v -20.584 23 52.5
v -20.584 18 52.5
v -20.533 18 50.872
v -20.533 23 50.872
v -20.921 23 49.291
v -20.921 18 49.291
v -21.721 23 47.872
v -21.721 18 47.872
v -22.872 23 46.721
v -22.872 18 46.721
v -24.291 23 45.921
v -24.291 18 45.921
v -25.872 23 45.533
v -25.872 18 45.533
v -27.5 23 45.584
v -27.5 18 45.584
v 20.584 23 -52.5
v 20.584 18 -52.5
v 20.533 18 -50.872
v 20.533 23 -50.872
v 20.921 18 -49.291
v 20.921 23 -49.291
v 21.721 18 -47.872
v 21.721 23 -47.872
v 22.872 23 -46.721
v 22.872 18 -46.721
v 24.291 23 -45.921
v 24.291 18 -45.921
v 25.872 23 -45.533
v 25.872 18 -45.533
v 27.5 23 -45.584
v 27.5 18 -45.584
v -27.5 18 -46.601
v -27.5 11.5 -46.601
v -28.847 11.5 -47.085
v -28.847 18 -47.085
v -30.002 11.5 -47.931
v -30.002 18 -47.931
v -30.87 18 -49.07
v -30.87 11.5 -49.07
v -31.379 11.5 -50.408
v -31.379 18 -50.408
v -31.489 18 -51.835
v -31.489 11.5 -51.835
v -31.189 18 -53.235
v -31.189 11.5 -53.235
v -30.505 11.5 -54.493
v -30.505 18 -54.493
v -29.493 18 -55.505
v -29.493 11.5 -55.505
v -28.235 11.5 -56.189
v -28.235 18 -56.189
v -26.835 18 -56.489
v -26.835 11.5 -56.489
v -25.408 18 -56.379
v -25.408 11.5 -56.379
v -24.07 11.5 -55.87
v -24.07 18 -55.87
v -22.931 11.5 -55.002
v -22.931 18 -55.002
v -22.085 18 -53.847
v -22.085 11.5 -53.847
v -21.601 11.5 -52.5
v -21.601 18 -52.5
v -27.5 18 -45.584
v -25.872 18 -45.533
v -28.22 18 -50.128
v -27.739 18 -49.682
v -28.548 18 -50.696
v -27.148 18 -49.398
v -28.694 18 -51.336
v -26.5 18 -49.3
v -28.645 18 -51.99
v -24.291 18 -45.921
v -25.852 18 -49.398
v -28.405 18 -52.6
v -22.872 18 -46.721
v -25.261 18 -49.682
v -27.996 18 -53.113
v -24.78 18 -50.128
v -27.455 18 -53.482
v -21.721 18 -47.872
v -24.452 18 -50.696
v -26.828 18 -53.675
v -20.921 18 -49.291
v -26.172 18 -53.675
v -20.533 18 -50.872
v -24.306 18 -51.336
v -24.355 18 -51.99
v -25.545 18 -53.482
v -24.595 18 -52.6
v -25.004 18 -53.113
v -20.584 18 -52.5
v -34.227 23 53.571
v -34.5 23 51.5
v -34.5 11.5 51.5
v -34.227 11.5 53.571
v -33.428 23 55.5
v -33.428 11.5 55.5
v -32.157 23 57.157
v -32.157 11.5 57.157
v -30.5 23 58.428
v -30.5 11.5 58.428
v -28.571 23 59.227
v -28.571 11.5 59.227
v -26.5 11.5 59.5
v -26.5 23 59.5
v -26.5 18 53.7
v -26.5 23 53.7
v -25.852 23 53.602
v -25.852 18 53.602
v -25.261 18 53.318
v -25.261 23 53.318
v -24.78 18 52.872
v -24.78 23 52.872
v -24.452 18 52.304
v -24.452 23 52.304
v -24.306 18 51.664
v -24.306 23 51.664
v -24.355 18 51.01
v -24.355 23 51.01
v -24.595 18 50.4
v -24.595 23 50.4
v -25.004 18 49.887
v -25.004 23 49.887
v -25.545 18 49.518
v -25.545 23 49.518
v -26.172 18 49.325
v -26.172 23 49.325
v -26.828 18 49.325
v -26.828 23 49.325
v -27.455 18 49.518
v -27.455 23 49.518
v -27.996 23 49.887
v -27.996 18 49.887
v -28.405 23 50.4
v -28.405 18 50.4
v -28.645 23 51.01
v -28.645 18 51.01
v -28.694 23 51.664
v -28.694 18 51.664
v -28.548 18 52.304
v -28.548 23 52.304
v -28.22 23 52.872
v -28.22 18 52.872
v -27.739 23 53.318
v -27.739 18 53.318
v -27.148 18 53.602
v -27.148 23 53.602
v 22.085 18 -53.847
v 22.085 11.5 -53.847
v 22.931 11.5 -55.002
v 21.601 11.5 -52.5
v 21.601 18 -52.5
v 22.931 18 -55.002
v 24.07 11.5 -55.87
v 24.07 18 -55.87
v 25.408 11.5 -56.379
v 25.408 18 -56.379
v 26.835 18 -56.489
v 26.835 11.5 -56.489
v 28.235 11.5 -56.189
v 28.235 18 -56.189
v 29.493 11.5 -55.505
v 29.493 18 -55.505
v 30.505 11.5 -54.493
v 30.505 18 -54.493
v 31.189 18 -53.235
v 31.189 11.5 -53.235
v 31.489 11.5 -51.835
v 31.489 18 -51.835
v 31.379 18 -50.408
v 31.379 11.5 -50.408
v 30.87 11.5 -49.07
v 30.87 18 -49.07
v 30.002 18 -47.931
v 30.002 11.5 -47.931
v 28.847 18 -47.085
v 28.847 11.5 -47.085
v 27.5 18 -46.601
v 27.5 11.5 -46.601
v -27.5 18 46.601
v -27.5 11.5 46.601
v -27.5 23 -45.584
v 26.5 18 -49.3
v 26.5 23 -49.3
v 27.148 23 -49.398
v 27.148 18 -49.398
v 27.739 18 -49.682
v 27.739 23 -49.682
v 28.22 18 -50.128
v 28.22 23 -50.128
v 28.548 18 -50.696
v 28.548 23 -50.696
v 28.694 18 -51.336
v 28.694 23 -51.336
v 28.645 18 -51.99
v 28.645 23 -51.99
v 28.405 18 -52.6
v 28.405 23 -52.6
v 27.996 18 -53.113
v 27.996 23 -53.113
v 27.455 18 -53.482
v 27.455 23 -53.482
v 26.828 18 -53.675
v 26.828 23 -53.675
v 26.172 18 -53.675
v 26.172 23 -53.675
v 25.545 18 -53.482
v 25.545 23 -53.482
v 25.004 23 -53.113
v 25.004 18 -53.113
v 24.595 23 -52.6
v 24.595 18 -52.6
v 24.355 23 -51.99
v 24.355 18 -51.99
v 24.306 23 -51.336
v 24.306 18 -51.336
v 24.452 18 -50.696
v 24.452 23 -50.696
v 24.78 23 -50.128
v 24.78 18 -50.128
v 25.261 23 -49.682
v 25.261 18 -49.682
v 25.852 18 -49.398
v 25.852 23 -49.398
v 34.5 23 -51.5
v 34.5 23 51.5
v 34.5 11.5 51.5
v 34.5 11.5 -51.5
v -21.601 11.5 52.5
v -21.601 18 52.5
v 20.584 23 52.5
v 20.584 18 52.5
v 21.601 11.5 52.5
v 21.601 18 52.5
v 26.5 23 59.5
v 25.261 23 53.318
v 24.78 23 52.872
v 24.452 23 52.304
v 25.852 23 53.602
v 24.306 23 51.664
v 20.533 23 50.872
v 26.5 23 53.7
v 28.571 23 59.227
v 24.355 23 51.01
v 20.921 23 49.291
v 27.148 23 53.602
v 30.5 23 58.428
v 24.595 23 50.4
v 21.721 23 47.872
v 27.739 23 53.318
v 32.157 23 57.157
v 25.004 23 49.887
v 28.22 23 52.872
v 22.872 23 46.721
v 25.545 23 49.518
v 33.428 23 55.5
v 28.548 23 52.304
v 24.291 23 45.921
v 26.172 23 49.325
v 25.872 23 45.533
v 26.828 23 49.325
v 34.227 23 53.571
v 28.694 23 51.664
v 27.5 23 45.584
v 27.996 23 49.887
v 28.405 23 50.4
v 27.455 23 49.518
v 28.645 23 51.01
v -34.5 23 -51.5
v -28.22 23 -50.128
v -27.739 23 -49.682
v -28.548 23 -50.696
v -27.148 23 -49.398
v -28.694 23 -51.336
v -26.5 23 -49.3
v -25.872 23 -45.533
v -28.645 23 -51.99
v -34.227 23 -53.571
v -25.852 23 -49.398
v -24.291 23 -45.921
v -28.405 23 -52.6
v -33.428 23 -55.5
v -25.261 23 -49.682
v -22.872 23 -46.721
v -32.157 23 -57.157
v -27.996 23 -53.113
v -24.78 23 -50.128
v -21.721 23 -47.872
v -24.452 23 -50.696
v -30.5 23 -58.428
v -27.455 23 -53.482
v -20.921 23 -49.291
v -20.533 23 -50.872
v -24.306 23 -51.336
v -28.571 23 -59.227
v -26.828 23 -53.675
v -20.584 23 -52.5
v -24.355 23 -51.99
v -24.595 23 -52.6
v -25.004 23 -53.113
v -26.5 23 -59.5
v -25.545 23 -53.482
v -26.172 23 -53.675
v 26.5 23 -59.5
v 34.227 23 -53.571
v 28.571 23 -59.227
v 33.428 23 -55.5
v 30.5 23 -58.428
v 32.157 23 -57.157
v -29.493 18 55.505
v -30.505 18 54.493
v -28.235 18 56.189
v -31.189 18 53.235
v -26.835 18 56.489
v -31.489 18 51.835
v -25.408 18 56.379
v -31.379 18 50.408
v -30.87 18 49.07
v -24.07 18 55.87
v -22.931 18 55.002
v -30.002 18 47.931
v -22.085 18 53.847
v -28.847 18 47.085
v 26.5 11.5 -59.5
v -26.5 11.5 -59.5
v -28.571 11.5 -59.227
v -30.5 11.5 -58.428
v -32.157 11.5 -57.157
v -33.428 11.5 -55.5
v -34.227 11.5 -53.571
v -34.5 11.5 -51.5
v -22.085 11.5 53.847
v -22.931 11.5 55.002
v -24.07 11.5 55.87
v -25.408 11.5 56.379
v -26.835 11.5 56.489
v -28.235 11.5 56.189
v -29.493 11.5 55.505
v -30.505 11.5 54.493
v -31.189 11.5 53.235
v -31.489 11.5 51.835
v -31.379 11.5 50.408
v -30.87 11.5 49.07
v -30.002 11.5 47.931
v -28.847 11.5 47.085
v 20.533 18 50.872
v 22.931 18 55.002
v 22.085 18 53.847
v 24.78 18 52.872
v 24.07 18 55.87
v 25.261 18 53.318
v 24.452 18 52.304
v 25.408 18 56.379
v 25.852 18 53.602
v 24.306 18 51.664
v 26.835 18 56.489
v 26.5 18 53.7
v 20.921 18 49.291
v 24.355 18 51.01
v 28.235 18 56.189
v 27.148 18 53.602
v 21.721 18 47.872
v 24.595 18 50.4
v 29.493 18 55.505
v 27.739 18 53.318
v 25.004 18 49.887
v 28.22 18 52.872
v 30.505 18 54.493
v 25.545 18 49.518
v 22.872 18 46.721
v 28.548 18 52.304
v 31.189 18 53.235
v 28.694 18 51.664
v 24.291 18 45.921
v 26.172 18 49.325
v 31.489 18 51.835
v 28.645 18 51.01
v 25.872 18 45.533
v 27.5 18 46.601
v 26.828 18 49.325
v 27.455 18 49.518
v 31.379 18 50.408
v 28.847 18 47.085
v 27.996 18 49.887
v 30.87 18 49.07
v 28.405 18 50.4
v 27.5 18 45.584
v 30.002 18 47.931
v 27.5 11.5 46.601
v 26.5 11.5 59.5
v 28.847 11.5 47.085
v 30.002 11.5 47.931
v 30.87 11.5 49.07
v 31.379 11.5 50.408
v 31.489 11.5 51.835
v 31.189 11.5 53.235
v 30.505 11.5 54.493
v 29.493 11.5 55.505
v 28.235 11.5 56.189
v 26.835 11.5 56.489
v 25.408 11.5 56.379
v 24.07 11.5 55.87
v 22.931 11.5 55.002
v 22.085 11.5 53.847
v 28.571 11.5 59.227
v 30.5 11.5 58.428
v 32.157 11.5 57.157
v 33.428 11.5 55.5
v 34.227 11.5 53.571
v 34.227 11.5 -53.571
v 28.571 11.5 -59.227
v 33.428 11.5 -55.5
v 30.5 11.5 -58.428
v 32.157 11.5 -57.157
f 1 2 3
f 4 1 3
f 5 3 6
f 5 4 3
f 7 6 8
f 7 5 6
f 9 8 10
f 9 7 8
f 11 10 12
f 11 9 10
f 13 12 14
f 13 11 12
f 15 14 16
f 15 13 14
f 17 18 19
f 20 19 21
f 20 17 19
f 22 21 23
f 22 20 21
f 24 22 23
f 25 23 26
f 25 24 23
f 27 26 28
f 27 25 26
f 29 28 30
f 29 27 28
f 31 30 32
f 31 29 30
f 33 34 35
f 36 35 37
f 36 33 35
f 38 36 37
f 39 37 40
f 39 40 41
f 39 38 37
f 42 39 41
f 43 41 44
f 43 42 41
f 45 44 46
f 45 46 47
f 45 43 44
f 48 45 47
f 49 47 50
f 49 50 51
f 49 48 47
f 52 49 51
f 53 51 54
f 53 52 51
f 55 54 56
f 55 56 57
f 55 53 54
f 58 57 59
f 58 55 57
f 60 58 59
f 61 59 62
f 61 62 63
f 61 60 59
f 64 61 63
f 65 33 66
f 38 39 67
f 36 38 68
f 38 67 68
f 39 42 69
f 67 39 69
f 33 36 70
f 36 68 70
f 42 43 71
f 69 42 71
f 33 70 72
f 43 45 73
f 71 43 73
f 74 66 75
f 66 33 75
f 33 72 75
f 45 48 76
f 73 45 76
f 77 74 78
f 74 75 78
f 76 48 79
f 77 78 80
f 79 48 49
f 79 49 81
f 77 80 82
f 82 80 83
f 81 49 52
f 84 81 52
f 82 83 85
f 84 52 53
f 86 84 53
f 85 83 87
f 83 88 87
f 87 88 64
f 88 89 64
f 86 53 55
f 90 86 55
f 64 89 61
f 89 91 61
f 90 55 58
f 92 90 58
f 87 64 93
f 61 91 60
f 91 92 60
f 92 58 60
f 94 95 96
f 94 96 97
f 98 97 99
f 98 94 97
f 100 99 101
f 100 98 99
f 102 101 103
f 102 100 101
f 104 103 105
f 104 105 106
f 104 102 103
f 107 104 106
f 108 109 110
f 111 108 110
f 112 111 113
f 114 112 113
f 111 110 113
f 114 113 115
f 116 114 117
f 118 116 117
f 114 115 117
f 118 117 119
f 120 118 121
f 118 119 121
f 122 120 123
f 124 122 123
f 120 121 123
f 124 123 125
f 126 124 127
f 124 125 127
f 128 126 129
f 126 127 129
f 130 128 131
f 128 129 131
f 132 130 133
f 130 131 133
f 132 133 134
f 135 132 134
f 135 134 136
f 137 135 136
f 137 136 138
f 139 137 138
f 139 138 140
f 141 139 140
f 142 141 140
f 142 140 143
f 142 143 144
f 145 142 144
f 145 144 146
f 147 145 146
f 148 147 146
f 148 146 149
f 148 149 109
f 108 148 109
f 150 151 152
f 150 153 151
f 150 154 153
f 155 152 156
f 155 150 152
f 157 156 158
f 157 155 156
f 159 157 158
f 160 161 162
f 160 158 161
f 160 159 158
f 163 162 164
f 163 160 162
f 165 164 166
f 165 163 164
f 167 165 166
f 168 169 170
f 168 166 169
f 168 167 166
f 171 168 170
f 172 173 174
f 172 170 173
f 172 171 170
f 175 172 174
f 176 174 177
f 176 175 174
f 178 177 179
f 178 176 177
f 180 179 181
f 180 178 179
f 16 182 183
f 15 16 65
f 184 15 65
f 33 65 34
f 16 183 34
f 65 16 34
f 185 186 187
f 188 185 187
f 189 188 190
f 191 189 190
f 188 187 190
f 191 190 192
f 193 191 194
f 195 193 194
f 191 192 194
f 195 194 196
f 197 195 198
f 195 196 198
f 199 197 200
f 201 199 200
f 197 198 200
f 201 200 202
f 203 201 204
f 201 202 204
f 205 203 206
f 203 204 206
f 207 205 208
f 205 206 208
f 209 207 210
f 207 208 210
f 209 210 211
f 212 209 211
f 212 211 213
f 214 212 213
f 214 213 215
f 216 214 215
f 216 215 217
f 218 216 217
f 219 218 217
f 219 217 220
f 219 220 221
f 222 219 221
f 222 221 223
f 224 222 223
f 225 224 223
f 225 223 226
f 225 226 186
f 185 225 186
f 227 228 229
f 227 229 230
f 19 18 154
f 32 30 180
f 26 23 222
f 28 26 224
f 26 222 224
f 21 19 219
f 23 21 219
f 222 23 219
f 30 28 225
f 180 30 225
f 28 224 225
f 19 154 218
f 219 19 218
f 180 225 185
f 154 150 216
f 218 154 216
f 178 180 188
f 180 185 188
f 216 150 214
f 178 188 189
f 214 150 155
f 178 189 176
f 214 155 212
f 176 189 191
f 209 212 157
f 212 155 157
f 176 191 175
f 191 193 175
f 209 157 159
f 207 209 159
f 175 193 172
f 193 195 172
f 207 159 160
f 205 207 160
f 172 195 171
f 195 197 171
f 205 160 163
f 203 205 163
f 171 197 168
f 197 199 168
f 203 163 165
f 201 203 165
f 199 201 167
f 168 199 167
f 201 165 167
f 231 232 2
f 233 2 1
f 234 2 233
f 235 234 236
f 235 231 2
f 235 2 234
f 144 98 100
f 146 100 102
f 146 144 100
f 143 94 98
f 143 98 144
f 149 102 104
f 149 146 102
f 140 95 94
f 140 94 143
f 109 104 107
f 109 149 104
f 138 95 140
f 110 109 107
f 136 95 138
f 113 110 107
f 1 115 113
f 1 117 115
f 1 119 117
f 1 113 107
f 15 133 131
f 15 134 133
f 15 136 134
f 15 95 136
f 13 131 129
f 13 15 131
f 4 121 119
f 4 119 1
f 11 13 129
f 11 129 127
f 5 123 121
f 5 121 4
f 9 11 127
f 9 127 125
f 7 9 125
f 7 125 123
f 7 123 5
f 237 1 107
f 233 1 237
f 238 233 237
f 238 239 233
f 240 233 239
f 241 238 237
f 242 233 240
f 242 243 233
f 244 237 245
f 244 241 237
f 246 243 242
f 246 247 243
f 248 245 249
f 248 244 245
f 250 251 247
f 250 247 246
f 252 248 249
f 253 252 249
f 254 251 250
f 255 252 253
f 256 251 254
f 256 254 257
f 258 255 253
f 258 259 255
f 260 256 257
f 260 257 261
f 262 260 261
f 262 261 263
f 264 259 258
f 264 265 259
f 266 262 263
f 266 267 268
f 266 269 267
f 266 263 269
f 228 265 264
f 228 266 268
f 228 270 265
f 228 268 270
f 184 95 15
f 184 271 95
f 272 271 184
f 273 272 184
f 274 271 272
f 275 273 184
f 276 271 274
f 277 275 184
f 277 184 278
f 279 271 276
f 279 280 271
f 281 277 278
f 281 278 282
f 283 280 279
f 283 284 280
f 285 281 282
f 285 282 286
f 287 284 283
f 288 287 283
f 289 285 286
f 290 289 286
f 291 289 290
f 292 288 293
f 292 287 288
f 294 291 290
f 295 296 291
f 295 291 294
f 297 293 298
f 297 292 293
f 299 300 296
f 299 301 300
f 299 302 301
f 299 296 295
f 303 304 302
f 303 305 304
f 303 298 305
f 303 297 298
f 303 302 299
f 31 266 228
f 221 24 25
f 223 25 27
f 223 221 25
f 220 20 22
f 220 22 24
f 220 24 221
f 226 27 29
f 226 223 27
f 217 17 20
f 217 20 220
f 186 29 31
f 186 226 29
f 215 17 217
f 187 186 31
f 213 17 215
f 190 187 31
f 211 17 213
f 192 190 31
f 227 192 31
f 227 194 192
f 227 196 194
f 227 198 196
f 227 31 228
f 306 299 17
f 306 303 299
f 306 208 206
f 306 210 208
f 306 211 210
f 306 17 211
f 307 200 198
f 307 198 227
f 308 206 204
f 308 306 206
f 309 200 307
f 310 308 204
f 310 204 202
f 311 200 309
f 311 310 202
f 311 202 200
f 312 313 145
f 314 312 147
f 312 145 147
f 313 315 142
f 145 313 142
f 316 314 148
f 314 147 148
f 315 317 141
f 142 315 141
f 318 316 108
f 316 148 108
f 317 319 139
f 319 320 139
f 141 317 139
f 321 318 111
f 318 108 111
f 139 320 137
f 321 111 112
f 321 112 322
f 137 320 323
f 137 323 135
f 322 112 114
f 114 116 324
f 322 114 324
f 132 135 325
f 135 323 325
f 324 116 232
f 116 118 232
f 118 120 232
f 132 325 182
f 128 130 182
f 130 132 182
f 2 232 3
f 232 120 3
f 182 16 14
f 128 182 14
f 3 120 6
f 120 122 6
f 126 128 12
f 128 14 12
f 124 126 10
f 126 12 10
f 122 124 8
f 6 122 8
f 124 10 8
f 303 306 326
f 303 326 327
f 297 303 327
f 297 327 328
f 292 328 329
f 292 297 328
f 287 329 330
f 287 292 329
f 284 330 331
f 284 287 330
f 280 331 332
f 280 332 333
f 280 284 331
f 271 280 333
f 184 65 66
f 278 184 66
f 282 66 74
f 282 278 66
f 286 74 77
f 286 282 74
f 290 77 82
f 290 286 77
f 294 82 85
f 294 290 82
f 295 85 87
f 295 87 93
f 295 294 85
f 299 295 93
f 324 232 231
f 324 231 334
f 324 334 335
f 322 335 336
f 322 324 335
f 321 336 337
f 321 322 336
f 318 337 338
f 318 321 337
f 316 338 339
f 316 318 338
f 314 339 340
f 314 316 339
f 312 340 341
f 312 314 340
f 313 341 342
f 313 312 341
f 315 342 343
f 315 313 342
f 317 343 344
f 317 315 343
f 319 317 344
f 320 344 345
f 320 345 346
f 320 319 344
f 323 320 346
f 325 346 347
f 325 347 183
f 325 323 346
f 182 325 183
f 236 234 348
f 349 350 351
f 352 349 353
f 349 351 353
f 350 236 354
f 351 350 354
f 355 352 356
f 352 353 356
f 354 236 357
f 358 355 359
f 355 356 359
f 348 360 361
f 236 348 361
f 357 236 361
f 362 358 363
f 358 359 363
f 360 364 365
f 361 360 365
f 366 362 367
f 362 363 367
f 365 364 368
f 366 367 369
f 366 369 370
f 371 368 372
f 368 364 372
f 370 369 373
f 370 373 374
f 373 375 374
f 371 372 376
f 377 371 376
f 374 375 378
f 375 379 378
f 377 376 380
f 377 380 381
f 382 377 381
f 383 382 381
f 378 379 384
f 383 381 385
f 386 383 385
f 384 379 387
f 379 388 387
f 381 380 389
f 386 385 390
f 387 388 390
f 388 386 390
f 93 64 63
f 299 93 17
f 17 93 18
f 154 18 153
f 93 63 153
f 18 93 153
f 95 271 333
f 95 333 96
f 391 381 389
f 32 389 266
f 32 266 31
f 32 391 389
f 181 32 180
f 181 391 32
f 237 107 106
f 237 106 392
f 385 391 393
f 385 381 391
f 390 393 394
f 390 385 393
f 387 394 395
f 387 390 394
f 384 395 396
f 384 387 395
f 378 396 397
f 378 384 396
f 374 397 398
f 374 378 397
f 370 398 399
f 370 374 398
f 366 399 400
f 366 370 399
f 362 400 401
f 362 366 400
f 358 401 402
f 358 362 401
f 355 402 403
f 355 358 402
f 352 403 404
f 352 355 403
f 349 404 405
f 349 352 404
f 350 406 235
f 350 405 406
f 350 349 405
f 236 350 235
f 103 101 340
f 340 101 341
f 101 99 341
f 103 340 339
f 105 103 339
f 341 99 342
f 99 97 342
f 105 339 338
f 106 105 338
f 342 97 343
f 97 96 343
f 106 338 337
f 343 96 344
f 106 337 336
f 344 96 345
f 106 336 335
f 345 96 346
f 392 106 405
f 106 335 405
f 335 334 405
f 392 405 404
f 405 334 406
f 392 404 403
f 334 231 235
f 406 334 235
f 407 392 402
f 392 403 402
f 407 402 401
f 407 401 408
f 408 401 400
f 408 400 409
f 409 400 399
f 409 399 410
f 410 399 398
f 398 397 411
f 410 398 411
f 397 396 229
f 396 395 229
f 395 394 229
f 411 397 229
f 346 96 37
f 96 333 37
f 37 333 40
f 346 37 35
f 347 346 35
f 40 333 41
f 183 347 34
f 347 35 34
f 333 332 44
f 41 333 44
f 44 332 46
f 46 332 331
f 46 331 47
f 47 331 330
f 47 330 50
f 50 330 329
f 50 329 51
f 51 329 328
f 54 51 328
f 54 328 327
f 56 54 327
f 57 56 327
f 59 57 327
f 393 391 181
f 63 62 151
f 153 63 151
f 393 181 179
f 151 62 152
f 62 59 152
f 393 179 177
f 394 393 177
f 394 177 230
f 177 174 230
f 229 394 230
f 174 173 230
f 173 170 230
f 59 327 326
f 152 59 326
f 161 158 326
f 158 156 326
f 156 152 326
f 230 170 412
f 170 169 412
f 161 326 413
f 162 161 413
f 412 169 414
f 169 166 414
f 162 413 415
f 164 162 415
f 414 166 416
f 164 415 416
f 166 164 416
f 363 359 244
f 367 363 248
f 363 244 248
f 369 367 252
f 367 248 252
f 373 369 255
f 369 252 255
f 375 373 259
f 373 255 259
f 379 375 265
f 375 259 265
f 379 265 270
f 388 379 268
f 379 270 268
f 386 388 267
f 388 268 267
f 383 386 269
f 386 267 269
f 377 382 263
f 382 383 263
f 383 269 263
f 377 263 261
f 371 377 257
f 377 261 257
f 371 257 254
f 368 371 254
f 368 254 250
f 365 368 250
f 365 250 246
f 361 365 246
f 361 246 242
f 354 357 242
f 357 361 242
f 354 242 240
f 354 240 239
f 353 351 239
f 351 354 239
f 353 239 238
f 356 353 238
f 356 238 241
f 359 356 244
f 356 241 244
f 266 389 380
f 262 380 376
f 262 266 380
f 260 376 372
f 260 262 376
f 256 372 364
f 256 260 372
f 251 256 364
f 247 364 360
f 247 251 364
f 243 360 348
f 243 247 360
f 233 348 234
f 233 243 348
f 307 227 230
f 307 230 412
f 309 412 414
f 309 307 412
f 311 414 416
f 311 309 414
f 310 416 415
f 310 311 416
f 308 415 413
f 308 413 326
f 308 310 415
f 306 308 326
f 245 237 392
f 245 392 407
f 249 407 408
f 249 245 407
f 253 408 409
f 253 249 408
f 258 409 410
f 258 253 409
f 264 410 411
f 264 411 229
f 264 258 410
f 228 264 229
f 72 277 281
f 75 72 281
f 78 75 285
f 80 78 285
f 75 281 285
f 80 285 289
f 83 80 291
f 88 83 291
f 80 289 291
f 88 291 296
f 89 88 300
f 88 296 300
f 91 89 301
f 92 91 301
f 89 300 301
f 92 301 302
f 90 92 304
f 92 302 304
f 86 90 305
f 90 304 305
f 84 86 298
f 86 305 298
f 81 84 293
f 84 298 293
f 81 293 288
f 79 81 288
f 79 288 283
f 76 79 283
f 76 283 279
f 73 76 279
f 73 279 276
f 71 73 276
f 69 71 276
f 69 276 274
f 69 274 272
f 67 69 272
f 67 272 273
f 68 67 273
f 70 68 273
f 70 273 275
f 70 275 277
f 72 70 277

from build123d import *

# Parameters (mm, degrees)
SKETCH1_W           = 65
SKETCH1_H           = 115
SKETCH1_W_2         = 55
SKETCH1_H_2         = 105
BOSS_EXTRUDE1_DEPTH = 23
FILLET1_R           = 6
SKETCH2_R           = 6
BOSS_EXTRUDE2_DEPTH = 23
SKETCH4_R           = 2.2
CUT_EXTRUDE1_DEPTH  = 23
SKETCH7_W           = 55
SKETCH7_H           = 105
CUT_EXTRUDE2_DEPTH  = 13
SKETCH8_W           = 65
SKETCH8_H           = 11.5
CUT_EXTRUDE3_DEPTH  = 120
SKETCH9_R           = 5
CUT_EXTRUDE4_DEPTH  = 6.5
BOSS_EXTRUDE3_DEPTH = 11.5


with BuildPart() as part:
    # Sketch1 → Boss-Extrude1 (new body)
    with BuildSketch(Plane(origin=(0, 0, 0), x_dir=(1, 0, 0), z_dir=(0, 1, 0))):
        Rectangle(SKETCH1_W, SKETCH1_H)
        Rectangle(SKETCH1_W_2, SKETCH1_H_2, mode=Mode.SUBTRACT)
    extrude(amount=BOSS_EXTRUDE1_DEPTH)

    # Fillet1
    fillet1_edges = [part.edges().sort_by_distance(p)[0] for p in [
        (32.5, 11.5, 57.5),
        (-32.5, 11.5, 57.5),
        (-32.5, 11.5, -57.5),
        (32.5, 11.5, -57.5),
    ]]
    fillet(fillet1_edges, radius=FILLET1_R)

    # Sketch2 → Boss-Extrude2 (add)
    with BuildSketch(Plane(origin=(0, 23, 0), x_dir=(1, 0, 0), z_dir=(0, 1, 0))):
        with Locations((-26.5, 51.5)):
            Circle(SKETCH2_R)
        with Locations((26.5, 51.5)):
            Circle(SKETCH2_R)
        with Locations((-26.5, -51.5)):
            Circle(SKETCH2_R)
        with Locations((26.5, -51.5)):
            Circle(SKETCH2_R)
    extrude(amount=-BOSS_EXTRUDE2_DEPTH)

    # Sketch4 → Cut-Extrude1 (cut)
    with BuildSketch(Plane(origin=(0, 23, 0), x_dir=(1, 0, 0), z_dir=(0, 1, 0))):
        with Locations(Location((-26.5, 51.5, 0), (0, 0, 270))):
            Circle(SKETCH4_R)
        with Locations(Location((26.5, 51.5, 0), (0, 0, 270))):
            Circle(SKETCH4_R)
        with Locations(Location((26.5, -51.5, 0), (0, 0, 270))):
            Circle(SKETCH4_R)
        with Locations(Location((-26.5, -51.5, 0), (0, 0, 270))):
            Circle(SKETCH4_R)
    extrude(amount=-CUT_EXTRUDE1_DEPTH, mode=Mode.SUBTRACT)

    # Sketch7 → Cut-Extrude2 (cut)
    with BuildSketch(Plane(origin=(0, 18, 0), x_dir=(1, 0, 0), z_dir=(0, 1, 0))):
        Rectangle(SKETCH7_W, SKETCH7_H)
    extrude(amount=-CUT_EXTRUDE2_DEPTH, mode=Mode.SUBTRACT)

    # Sketch8 → Cut-Extrude3 (cut)
    with BuildSketch(Plane.XY.offset(57.5)):
        with Locations((0, 5.75)):
            Rectangle(SKETCH8_W, SKETCH8_H)
    extrude(amount=-CUT_EXTRUDE3_DEPTH, mode=Mode.SUBTRACT)

    # Sketch9 → Cut-Extrude4 (cut)
    with BuildSketch(Plane.XZ.offset(-18)):
        with Locations((-26.5, -51.5)):
            Circle(SKETCH9_R)
        with Locations((26.5, -51.5)):
            Circle(SKETCH9_R)
        with Locations((26.5, 51.5)):
            Circle(SKETCH9_R)
        with Locations((-26.5, 51.5)):
            Circle(SKETCH9_R)
    extrude(amount=CUT_EXTRUDE4_DEPTH, mode=Mode.SUBTRACT)

    # Sketch10 → Boss-Extrude3 (add)
    with BuildSketch(Plane(origin=(0, 23, 0), x_dir=(1, 0, 0), z_dir=(0, 1, 0))):
        with BuildLine():
            Line((-26.5, -59.5), (26.5, -59.5))
            ThreePointArc((26.5, -59.5), (32.156854249, -57.156854249), (34.5, -51.5))
            Line((34.5, -51.5), (34.5, 51.5))
            ThreePointArc((34.5, 51.5), (32.156854249, 57.156854249), (26.5, 59.5))
            Line((26.5, 59.5), (-26.5, 59.5))
            ThreePointArc((-26.5, 59.5), (-32.156854249, 57.156854249), (-34.5, 51.5))
            Line((-34.5, 51.5), (-34.5, -51.5))
            ThreePointArc((-34.5, -51.5), (-32.156854249, -57.156854249), (-26.5, -59.5))
        make_face()
        with BuildLine():
            Line((-26.5, -57.5), (26.5, -57.5))
            ThreePointArc((26.5, -57.5), (30.742640687, -55.742640687), (32.5, -51.5))
            Line((32.5, -51.5), (32.5, 51.5))
            ThreePointArc((32.5, 51.5), (30.742640687, 55.742640687), (26.5, 57.5))
            Line((26.5, 57.5), (-26.5, 57.5))
            ThreePointArc((-26.5, 57.5), (-30.742640687, 55.742640687), (-32.5, 51.5))
            Line((-32.5, 51.5), (-32.5, -51.5))
            ThreePointArc((-32.5, -51.5), (-30.742640687, -55.742640687), (-26.5, -57.5))
        make_face(mode=Mode.SUBTRACT)
    extrude(amount=-BOSS_EXTRUDE3_DEPTH)


solid = part.part
